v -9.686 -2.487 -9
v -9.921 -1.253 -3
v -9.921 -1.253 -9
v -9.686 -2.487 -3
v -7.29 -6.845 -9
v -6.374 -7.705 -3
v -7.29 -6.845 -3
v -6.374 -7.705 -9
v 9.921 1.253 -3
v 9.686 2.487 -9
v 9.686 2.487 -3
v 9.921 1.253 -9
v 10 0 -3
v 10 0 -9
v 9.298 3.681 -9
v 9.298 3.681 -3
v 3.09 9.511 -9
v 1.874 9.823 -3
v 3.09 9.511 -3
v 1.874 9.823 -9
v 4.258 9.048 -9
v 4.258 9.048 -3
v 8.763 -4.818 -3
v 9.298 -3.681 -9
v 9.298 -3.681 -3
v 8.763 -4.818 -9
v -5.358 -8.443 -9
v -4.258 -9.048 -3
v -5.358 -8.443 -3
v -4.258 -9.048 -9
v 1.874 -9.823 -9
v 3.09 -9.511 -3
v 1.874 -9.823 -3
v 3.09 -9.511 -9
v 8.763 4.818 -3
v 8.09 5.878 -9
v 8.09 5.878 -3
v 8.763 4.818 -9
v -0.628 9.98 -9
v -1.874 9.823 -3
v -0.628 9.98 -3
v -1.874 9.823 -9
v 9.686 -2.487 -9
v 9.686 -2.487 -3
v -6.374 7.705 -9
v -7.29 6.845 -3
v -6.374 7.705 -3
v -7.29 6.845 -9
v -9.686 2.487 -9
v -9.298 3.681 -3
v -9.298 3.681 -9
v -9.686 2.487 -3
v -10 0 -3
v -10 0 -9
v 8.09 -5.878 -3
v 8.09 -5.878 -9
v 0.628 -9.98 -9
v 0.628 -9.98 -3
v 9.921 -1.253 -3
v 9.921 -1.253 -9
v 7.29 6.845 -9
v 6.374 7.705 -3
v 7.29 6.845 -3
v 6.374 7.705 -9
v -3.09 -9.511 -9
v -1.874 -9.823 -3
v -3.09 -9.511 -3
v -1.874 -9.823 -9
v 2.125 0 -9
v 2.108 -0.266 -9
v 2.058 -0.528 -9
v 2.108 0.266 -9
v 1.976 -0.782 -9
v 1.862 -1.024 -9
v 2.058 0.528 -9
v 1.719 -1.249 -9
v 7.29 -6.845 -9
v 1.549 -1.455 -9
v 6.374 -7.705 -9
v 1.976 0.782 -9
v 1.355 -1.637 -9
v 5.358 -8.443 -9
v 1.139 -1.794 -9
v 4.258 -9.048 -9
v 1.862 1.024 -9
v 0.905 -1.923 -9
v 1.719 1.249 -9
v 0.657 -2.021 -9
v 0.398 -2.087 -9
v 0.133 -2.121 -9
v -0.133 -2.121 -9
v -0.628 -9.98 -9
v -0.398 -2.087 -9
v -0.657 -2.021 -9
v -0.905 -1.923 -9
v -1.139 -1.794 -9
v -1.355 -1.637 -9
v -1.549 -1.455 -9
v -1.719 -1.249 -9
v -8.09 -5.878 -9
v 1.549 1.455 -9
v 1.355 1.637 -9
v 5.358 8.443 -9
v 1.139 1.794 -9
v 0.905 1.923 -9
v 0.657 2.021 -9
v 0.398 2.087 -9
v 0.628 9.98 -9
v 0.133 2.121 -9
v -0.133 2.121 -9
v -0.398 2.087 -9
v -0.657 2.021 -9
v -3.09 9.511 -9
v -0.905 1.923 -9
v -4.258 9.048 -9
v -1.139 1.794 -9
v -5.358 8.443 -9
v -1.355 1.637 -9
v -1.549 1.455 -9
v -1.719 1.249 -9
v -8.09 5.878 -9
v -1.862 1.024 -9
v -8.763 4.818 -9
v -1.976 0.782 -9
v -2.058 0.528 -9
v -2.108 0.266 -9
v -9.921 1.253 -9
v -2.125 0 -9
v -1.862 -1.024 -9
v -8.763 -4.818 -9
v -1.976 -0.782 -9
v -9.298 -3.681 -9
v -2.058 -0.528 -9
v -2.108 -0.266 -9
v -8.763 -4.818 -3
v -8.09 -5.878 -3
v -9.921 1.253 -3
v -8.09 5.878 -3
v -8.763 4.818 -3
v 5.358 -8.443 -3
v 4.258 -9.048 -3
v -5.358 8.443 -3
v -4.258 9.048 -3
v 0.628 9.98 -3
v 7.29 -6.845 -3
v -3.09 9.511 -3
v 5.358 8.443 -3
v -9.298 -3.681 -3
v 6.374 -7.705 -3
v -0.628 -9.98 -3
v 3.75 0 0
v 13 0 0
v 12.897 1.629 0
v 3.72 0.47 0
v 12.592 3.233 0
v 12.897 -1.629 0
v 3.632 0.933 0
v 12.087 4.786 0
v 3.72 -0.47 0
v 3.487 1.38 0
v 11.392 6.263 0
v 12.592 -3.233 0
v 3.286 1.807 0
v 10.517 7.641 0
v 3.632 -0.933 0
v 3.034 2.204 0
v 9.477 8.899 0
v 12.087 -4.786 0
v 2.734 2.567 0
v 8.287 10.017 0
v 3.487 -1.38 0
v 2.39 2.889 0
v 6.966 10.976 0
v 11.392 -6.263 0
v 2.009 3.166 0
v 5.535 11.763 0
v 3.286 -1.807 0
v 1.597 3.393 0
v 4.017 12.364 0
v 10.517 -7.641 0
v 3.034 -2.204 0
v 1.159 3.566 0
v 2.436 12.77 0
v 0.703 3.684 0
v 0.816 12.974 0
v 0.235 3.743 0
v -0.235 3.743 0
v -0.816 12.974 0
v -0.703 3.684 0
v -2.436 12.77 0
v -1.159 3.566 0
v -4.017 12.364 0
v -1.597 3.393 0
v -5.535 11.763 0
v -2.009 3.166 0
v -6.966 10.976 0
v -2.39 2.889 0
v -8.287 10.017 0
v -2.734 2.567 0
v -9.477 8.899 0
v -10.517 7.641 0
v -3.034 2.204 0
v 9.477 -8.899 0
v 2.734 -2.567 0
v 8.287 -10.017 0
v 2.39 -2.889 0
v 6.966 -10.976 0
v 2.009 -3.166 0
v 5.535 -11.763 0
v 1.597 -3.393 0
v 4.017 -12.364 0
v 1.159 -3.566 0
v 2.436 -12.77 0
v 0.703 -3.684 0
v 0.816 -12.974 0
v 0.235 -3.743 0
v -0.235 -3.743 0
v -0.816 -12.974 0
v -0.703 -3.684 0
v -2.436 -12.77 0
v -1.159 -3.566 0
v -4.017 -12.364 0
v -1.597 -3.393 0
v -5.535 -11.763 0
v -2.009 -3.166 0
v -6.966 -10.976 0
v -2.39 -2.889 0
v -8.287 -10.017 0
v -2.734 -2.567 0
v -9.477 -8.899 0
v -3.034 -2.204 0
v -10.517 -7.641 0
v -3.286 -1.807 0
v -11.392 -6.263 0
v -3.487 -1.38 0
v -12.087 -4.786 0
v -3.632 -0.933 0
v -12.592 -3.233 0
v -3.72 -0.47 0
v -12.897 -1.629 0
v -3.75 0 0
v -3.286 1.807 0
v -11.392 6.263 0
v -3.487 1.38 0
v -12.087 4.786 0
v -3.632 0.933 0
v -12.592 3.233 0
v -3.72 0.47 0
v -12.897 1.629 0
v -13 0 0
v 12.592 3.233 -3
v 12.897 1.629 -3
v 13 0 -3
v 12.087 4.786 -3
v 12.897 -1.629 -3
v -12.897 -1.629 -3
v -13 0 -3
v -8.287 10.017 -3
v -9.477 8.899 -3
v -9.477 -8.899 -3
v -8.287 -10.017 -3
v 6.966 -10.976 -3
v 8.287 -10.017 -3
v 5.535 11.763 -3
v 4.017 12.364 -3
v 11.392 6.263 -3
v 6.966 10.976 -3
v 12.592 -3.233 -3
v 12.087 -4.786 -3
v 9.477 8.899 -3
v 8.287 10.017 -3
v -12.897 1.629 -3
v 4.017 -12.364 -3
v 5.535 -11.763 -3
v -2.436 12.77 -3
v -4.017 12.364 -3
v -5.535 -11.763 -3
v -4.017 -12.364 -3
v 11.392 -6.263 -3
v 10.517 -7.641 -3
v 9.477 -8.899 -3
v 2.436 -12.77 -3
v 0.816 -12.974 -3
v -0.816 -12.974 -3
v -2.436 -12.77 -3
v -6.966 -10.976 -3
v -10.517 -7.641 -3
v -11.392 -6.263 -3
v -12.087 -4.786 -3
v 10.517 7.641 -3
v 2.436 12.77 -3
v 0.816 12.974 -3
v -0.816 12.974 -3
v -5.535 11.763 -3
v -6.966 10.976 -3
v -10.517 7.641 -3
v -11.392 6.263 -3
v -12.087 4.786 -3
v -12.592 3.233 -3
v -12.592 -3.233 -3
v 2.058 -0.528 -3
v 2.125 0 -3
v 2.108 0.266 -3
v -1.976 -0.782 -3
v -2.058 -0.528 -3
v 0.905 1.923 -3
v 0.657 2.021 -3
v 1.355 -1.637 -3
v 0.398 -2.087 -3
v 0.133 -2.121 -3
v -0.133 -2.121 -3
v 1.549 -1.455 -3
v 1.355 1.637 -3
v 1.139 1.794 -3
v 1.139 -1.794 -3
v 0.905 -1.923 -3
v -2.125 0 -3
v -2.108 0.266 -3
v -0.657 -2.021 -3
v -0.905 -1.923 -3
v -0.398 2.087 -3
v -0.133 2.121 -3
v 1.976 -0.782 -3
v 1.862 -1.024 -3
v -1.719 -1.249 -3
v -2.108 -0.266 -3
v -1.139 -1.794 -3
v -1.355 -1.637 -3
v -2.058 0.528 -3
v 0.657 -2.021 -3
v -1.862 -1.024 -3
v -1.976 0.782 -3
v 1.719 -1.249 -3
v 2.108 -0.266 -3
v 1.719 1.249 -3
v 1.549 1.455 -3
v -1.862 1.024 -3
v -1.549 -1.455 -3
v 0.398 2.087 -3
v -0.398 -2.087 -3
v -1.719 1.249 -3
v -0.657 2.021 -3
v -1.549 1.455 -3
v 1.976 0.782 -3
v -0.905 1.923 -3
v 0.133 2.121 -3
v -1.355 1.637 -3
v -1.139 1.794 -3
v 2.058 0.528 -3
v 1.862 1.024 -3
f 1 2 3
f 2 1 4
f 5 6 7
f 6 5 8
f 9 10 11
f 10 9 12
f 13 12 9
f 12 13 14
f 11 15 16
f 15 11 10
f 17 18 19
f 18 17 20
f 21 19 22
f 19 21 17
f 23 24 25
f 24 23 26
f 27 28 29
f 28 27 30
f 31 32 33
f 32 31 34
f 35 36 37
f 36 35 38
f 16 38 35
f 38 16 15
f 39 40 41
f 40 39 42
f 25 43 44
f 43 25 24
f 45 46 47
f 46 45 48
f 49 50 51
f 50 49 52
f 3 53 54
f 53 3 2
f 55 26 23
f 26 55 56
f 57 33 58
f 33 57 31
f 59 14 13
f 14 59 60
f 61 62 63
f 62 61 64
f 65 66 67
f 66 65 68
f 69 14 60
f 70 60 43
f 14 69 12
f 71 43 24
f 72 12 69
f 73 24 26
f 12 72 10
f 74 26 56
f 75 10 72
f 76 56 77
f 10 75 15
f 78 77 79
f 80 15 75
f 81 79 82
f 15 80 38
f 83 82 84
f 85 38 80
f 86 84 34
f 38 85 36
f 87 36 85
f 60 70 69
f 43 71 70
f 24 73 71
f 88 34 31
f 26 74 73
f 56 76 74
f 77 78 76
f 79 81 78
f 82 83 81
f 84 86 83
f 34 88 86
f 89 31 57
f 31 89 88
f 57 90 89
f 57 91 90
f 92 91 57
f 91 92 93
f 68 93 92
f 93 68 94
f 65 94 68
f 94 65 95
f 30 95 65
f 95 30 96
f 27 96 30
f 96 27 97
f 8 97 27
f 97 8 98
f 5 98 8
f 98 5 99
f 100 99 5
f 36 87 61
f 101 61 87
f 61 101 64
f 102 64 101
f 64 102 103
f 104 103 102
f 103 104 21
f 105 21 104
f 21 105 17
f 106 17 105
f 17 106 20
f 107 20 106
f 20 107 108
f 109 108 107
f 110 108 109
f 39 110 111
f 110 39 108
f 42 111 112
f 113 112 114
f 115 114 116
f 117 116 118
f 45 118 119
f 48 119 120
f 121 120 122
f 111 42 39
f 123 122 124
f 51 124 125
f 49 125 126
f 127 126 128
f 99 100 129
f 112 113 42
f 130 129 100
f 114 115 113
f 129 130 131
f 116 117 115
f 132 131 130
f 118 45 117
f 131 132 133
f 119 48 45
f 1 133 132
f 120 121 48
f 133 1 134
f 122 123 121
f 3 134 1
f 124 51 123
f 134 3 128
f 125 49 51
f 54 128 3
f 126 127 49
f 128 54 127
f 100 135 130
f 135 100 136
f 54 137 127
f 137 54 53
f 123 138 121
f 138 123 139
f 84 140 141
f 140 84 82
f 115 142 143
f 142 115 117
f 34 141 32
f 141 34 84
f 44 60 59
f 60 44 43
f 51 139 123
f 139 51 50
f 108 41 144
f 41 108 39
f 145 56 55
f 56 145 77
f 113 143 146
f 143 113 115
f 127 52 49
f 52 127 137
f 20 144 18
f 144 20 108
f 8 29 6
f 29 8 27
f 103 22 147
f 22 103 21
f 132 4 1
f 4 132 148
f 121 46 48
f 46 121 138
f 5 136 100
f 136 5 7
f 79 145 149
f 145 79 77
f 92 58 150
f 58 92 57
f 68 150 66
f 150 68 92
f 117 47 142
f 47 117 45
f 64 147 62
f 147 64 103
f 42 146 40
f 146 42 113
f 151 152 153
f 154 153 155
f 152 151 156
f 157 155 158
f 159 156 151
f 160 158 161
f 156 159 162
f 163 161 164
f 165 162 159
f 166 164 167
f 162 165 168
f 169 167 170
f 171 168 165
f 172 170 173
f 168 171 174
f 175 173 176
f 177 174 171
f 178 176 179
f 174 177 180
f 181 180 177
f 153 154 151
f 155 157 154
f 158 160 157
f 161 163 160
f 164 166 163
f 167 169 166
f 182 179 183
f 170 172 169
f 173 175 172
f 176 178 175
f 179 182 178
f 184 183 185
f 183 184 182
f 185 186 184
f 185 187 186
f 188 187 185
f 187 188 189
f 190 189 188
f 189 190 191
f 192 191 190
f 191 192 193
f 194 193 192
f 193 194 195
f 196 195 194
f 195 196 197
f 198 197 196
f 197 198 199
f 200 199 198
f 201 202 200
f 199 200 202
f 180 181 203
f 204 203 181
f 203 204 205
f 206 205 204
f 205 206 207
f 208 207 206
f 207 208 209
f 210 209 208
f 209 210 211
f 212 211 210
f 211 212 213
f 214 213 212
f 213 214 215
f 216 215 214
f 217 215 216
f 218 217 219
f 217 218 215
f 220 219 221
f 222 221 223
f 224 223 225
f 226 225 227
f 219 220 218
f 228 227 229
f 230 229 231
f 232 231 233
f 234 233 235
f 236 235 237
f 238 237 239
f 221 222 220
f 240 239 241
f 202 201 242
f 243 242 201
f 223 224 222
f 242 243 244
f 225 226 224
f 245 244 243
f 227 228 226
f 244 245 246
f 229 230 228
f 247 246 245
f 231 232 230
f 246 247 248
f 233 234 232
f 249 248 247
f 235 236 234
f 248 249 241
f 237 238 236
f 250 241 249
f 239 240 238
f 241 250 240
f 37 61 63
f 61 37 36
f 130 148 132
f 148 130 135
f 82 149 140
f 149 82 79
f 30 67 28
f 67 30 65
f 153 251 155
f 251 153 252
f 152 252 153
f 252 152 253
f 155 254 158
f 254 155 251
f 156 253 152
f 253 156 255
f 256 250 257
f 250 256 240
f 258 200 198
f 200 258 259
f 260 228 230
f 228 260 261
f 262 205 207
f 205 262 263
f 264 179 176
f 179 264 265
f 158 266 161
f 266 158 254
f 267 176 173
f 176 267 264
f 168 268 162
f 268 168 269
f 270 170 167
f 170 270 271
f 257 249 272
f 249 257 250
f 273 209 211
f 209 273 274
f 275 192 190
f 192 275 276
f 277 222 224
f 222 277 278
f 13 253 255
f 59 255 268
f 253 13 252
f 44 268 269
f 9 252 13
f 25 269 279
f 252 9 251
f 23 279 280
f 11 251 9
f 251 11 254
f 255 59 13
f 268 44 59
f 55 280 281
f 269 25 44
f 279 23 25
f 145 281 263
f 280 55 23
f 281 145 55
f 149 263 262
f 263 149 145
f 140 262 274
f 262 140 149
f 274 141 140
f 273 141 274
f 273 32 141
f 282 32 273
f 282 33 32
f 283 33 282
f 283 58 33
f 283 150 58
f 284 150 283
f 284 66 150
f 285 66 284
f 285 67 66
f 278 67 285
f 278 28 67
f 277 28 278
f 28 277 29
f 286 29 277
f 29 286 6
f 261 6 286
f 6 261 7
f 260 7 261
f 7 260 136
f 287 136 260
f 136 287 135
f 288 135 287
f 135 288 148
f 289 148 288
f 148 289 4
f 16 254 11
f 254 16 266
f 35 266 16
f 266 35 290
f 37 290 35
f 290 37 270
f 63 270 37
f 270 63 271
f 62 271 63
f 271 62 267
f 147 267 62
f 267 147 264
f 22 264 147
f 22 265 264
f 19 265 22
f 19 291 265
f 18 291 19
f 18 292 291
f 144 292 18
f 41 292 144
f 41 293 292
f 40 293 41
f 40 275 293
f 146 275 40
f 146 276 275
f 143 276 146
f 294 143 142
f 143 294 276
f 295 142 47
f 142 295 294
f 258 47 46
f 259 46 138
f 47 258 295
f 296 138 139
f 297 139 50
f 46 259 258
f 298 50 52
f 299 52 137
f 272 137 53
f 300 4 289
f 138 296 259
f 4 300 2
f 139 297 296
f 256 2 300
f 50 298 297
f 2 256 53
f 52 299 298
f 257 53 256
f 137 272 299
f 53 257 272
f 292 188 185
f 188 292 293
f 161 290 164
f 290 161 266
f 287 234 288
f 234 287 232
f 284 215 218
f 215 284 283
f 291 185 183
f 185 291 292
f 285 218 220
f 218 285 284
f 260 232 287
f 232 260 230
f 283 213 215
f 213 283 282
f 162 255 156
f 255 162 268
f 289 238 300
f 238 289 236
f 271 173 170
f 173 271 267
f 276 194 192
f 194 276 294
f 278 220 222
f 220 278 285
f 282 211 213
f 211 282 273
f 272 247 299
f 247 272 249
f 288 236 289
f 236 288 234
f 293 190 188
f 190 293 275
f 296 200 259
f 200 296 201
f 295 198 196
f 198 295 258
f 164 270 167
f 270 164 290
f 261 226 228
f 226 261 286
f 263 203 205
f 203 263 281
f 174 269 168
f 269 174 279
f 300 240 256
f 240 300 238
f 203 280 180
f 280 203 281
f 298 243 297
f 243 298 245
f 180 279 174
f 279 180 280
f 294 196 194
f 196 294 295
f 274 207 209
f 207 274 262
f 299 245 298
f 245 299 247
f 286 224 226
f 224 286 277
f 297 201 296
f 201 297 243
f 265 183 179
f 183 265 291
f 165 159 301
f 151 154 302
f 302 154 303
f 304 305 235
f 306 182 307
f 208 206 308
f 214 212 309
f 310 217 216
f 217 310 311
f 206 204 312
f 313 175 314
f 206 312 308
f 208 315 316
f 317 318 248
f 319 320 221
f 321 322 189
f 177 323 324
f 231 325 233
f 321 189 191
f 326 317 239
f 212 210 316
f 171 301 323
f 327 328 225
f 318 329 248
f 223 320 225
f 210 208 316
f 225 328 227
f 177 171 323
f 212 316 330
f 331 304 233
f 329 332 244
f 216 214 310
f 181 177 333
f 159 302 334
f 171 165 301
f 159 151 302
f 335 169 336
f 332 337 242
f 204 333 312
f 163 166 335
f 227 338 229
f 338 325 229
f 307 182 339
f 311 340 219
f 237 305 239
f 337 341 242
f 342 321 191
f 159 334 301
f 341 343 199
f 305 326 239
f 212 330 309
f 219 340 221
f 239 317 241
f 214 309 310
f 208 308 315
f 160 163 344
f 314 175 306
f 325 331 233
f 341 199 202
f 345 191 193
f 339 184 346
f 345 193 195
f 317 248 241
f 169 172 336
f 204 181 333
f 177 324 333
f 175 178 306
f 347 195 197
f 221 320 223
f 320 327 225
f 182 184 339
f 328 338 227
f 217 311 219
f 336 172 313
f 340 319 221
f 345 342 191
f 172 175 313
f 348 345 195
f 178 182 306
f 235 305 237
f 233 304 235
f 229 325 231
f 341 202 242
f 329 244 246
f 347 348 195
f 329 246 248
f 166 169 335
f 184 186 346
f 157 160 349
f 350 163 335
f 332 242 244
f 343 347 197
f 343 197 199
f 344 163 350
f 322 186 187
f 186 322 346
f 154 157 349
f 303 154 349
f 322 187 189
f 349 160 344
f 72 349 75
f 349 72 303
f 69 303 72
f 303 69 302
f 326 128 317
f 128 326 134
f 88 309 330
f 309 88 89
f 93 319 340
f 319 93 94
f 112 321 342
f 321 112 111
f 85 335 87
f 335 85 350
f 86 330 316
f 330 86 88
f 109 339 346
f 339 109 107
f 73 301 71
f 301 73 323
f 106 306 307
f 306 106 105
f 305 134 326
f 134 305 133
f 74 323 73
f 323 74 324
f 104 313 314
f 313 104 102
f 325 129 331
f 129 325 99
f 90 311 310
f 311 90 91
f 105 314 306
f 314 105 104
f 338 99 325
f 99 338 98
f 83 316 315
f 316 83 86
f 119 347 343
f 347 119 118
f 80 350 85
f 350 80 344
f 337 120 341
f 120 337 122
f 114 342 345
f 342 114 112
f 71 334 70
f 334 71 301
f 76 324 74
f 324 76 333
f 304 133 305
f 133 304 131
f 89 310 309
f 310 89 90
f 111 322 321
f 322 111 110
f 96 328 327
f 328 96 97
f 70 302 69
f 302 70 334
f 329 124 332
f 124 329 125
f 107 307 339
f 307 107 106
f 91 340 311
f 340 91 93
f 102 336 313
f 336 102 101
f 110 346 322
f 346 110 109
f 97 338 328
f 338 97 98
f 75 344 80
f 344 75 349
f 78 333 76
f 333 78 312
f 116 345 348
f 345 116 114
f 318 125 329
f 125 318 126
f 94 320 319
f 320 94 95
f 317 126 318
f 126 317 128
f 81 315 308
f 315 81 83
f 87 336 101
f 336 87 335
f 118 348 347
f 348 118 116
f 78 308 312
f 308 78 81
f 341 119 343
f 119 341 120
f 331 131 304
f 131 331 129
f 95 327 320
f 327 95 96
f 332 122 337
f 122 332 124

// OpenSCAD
$fn = 50;


difference() {
	union() {
		translate(v = [0, 0, -9.0000000000]) {
			cylinder(h = 9, r = 10.0000000000);
		}
		translate(v = [0, 0, -3.0000000000]) {
			cylinder(h = 3, r = 13.0000000000);
		}
	}
	union() {
		translate(v = [0, 0, 0]) {
			rotate(a = [0, 0, 0]) {
				difference() {
					union() {
						#translate(v = [0, 0, -9.0000000000]) {
							cylinder(h = 9, r = 2.0000000000);
						}
						#translate(v = [0, 0, -3]) {
							cylinder(h = 3, r1 = 2.1250000000, r2 = 3.7500000000);
						}
						#translate(v = [0, 0, -9.0000000000]) {
							cylinder(h = 9, r = 2.1250000000);
						}
						#translate(v = [0, 0, -9.0000000000]) {
							cylinder(h = 9, r = 2.0000000000);
						}
					}
					union();
				}
			}
		}
	}
}
